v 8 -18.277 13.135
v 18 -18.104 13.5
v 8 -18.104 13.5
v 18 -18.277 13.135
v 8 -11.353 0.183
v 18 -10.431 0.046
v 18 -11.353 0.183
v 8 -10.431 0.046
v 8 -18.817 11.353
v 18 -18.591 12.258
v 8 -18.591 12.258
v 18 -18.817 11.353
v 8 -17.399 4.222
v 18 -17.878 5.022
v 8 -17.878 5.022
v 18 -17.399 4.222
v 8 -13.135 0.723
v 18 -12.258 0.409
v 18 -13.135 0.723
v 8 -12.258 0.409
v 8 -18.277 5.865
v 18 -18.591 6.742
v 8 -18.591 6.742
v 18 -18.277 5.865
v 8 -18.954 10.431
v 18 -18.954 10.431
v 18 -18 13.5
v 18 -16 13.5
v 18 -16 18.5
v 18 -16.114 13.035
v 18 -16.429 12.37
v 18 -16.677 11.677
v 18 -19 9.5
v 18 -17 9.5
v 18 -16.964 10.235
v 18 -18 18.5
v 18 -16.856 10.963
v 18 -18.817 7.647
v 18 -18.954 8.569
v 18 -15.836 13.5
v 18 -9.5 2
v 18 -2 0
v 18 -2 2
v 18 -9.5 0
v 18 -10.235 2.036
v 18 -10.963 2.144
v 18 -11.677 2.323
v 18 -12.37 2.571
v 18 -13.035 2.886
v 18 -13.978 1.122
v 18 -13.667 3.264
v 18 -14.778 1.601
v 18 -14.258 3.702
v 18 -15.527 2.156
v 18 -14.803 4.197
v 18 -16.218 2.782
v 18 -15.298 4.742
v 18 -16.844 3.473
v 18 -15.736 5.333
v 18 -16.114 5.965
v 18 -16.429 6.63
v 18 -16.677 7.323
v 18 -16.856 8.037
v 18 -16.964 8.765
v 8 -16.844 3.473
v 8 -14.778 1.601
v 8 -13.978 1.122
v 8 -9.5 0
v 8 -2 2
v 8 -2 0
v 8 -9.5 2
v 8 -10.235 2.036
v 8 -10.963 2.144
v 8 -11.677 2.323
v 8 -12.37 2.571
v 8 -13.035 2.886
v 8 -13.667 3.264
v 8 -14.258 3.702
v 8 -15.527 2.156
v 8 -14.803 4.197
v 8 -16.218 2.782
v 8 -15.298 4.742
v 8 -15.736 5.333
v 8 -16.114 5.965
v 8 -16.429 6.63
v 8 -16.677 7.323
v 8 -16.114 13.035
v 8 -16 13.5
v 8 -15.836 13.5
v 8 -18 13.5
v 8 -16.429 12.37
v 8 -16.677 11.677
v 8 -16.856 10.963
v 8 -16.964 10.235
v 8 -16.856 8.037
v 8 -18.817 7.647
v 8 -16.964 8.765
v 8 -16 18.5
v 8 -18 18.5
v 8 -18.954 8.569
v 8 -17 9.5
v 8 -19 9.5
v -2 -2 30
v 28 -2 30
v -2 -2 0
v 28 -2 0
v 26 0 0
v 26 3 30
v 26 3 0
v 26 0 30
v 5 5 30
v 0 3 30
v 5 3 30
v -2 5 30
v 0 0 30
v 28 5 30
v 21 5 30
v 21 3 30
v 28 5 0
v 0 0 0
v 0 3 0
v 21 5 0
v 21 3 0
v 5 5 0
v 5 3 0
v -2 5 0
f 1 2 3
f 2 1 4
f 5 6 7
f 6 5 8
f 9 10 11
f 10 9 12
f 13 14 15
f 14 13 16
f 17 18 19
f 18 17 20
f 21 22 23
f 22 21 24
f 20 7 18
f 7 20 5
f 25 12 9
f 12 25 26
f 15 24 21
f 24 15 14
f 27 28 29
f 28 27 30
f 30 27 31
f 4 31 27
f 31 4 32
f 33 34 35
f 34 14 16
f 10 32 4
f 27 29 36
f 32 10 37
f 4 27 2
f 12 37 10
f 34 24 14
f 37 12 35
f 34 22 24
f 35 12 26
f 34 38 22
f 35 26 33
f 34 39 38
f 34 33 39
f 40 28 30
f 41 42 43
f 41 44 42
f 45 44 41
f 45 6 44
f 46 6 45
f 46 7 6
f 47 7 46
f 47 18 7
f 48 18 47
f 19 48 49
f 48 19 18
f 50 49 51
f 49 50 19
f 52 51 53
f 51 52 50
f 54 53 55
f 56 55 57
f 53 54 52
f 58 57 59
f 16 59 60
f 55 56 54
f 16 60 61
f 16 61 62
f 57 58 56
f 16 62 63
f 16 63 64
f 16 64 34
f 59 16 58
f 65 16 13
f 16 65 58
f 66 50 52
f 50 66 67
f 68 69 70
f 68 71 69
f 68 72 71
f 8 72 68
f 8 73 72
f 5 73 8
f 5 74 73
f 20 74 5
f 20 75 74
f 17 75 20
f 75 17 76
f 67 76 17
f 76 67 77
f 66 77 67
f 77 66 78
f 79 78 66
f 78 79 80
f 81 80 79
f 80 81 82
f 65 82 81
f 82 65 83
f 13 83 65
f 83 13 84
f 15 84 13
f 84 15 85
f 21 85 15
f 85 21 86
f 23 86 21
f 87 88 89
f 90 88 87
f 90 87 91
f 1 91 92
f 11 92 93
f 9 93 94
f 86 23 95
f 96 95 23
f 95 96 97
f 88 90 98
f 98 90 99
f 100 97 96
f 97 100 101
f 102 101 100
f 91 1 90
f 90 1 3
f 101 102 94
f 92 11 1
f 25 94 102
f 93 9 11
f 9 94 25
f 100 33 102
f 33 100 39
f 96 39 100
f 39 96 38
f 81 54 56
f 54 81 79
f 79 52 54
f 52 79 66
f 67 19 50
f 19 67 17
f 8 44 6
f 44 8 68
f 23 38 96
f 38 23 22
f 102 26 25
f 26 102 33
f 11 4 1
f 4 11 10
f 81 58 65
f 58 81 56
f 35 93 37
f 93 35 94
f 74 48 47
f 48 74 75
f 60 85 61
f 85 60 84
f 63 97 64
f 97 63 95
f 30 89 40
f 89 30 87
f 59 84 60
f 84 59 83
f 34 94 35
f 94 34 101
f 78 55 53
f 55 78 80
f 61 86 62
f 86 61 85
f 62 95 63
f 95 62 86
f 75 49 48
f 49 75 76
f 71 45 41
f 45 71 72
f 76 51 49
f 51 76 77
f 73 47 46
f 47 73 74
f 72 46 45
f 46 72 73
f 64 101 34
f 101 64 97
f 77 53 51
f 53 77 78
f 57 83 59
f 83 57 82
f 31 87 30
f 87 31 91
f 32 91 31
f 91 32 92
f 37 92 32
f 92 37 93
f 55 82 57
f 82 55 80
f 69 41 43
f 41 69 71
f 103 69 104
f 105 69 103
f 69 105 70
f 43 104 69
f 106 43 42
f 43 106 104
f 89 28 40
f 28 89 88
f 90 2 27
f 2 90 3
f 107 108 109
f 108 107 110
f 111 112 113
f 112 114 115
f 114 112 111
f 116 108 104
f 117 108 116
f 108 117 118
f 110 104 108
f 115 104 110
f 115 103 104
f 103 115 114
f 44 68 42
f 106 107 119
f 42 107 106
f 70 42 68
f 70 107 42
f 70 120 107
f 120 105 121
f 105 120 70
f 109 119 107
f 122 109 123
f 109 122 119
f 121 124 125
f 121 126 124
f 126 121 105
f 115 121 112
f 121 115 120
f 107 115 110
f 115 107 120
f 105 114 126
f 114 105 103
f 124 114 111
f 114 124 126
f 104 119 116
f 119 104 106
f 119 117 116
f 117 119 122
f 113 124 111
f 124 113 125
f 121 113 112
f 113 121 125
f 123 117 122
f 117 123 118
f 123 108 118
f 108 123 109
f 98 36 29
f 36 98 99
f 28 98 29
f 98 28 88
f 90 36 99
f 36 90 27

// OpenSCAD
// Definition size of housing
// **************************

width      = 26;    
height      = 30;     
space     = 3;
wall        = 2;
grip = 5;

dia     = 15;            
clipwid     = 10;
clipextra =4;
clipgrip =5;

//Definition of circle angular resolution
resol        = 64;           // Identical to housing !!!



    translate ([0,-wall,0]) cube([width,wall,height]); //back
    translate ([-wall,-wall,0]) cube([wall,space+wall*2,height]); //side
    translate ([width,-wall,0]) cube([wall,space+wall*2,height]); //side
    translate ([0,space,0]) cube([grip,wall,height]); //curtain hold 1
    translate ([width-grip,space,0]) cube([grip,wall,height]); //curtain hold 2
    
    translate ([width/2-clipwid/2,-dia/2-wall,0]) cube([clipwid,dia/2,wall]); //clip flat top



difference () {
    translate ([width/2-clipwid/2,-dia/2-wall,dia/2+wall]) rotate ([0,90,0]) cylinder ( h=clipwid, r=wall+dia/2, center=false, $fn = resol);

    translate ([width/2-clipwid/2-1,-dia/2-wall,dia/2+wall]) rotate ([0,90,0]) cylinder ( h=clipwid+2, r=dia/2, center=false, $fn = resol);

    translate ([width/2-clipwid/2-1,-dia/2-wall,wall]) cube([clipwid+2,dia/2,wall*2+dia]); //remove inside part

    translate ([width/2-clipwid/2-1,-dia-wall*2,wall+dia/2+clipextra]) cube([clipwid+2,dia/2+wall,wall*2+dia]); //remove outside part

}

    translate ([width/2-clipwid/2,-dia-wall*2+1,dia/2+wall+clipextra]) cube([clipwid,wall,clipgrip]); //clip straight grip section
